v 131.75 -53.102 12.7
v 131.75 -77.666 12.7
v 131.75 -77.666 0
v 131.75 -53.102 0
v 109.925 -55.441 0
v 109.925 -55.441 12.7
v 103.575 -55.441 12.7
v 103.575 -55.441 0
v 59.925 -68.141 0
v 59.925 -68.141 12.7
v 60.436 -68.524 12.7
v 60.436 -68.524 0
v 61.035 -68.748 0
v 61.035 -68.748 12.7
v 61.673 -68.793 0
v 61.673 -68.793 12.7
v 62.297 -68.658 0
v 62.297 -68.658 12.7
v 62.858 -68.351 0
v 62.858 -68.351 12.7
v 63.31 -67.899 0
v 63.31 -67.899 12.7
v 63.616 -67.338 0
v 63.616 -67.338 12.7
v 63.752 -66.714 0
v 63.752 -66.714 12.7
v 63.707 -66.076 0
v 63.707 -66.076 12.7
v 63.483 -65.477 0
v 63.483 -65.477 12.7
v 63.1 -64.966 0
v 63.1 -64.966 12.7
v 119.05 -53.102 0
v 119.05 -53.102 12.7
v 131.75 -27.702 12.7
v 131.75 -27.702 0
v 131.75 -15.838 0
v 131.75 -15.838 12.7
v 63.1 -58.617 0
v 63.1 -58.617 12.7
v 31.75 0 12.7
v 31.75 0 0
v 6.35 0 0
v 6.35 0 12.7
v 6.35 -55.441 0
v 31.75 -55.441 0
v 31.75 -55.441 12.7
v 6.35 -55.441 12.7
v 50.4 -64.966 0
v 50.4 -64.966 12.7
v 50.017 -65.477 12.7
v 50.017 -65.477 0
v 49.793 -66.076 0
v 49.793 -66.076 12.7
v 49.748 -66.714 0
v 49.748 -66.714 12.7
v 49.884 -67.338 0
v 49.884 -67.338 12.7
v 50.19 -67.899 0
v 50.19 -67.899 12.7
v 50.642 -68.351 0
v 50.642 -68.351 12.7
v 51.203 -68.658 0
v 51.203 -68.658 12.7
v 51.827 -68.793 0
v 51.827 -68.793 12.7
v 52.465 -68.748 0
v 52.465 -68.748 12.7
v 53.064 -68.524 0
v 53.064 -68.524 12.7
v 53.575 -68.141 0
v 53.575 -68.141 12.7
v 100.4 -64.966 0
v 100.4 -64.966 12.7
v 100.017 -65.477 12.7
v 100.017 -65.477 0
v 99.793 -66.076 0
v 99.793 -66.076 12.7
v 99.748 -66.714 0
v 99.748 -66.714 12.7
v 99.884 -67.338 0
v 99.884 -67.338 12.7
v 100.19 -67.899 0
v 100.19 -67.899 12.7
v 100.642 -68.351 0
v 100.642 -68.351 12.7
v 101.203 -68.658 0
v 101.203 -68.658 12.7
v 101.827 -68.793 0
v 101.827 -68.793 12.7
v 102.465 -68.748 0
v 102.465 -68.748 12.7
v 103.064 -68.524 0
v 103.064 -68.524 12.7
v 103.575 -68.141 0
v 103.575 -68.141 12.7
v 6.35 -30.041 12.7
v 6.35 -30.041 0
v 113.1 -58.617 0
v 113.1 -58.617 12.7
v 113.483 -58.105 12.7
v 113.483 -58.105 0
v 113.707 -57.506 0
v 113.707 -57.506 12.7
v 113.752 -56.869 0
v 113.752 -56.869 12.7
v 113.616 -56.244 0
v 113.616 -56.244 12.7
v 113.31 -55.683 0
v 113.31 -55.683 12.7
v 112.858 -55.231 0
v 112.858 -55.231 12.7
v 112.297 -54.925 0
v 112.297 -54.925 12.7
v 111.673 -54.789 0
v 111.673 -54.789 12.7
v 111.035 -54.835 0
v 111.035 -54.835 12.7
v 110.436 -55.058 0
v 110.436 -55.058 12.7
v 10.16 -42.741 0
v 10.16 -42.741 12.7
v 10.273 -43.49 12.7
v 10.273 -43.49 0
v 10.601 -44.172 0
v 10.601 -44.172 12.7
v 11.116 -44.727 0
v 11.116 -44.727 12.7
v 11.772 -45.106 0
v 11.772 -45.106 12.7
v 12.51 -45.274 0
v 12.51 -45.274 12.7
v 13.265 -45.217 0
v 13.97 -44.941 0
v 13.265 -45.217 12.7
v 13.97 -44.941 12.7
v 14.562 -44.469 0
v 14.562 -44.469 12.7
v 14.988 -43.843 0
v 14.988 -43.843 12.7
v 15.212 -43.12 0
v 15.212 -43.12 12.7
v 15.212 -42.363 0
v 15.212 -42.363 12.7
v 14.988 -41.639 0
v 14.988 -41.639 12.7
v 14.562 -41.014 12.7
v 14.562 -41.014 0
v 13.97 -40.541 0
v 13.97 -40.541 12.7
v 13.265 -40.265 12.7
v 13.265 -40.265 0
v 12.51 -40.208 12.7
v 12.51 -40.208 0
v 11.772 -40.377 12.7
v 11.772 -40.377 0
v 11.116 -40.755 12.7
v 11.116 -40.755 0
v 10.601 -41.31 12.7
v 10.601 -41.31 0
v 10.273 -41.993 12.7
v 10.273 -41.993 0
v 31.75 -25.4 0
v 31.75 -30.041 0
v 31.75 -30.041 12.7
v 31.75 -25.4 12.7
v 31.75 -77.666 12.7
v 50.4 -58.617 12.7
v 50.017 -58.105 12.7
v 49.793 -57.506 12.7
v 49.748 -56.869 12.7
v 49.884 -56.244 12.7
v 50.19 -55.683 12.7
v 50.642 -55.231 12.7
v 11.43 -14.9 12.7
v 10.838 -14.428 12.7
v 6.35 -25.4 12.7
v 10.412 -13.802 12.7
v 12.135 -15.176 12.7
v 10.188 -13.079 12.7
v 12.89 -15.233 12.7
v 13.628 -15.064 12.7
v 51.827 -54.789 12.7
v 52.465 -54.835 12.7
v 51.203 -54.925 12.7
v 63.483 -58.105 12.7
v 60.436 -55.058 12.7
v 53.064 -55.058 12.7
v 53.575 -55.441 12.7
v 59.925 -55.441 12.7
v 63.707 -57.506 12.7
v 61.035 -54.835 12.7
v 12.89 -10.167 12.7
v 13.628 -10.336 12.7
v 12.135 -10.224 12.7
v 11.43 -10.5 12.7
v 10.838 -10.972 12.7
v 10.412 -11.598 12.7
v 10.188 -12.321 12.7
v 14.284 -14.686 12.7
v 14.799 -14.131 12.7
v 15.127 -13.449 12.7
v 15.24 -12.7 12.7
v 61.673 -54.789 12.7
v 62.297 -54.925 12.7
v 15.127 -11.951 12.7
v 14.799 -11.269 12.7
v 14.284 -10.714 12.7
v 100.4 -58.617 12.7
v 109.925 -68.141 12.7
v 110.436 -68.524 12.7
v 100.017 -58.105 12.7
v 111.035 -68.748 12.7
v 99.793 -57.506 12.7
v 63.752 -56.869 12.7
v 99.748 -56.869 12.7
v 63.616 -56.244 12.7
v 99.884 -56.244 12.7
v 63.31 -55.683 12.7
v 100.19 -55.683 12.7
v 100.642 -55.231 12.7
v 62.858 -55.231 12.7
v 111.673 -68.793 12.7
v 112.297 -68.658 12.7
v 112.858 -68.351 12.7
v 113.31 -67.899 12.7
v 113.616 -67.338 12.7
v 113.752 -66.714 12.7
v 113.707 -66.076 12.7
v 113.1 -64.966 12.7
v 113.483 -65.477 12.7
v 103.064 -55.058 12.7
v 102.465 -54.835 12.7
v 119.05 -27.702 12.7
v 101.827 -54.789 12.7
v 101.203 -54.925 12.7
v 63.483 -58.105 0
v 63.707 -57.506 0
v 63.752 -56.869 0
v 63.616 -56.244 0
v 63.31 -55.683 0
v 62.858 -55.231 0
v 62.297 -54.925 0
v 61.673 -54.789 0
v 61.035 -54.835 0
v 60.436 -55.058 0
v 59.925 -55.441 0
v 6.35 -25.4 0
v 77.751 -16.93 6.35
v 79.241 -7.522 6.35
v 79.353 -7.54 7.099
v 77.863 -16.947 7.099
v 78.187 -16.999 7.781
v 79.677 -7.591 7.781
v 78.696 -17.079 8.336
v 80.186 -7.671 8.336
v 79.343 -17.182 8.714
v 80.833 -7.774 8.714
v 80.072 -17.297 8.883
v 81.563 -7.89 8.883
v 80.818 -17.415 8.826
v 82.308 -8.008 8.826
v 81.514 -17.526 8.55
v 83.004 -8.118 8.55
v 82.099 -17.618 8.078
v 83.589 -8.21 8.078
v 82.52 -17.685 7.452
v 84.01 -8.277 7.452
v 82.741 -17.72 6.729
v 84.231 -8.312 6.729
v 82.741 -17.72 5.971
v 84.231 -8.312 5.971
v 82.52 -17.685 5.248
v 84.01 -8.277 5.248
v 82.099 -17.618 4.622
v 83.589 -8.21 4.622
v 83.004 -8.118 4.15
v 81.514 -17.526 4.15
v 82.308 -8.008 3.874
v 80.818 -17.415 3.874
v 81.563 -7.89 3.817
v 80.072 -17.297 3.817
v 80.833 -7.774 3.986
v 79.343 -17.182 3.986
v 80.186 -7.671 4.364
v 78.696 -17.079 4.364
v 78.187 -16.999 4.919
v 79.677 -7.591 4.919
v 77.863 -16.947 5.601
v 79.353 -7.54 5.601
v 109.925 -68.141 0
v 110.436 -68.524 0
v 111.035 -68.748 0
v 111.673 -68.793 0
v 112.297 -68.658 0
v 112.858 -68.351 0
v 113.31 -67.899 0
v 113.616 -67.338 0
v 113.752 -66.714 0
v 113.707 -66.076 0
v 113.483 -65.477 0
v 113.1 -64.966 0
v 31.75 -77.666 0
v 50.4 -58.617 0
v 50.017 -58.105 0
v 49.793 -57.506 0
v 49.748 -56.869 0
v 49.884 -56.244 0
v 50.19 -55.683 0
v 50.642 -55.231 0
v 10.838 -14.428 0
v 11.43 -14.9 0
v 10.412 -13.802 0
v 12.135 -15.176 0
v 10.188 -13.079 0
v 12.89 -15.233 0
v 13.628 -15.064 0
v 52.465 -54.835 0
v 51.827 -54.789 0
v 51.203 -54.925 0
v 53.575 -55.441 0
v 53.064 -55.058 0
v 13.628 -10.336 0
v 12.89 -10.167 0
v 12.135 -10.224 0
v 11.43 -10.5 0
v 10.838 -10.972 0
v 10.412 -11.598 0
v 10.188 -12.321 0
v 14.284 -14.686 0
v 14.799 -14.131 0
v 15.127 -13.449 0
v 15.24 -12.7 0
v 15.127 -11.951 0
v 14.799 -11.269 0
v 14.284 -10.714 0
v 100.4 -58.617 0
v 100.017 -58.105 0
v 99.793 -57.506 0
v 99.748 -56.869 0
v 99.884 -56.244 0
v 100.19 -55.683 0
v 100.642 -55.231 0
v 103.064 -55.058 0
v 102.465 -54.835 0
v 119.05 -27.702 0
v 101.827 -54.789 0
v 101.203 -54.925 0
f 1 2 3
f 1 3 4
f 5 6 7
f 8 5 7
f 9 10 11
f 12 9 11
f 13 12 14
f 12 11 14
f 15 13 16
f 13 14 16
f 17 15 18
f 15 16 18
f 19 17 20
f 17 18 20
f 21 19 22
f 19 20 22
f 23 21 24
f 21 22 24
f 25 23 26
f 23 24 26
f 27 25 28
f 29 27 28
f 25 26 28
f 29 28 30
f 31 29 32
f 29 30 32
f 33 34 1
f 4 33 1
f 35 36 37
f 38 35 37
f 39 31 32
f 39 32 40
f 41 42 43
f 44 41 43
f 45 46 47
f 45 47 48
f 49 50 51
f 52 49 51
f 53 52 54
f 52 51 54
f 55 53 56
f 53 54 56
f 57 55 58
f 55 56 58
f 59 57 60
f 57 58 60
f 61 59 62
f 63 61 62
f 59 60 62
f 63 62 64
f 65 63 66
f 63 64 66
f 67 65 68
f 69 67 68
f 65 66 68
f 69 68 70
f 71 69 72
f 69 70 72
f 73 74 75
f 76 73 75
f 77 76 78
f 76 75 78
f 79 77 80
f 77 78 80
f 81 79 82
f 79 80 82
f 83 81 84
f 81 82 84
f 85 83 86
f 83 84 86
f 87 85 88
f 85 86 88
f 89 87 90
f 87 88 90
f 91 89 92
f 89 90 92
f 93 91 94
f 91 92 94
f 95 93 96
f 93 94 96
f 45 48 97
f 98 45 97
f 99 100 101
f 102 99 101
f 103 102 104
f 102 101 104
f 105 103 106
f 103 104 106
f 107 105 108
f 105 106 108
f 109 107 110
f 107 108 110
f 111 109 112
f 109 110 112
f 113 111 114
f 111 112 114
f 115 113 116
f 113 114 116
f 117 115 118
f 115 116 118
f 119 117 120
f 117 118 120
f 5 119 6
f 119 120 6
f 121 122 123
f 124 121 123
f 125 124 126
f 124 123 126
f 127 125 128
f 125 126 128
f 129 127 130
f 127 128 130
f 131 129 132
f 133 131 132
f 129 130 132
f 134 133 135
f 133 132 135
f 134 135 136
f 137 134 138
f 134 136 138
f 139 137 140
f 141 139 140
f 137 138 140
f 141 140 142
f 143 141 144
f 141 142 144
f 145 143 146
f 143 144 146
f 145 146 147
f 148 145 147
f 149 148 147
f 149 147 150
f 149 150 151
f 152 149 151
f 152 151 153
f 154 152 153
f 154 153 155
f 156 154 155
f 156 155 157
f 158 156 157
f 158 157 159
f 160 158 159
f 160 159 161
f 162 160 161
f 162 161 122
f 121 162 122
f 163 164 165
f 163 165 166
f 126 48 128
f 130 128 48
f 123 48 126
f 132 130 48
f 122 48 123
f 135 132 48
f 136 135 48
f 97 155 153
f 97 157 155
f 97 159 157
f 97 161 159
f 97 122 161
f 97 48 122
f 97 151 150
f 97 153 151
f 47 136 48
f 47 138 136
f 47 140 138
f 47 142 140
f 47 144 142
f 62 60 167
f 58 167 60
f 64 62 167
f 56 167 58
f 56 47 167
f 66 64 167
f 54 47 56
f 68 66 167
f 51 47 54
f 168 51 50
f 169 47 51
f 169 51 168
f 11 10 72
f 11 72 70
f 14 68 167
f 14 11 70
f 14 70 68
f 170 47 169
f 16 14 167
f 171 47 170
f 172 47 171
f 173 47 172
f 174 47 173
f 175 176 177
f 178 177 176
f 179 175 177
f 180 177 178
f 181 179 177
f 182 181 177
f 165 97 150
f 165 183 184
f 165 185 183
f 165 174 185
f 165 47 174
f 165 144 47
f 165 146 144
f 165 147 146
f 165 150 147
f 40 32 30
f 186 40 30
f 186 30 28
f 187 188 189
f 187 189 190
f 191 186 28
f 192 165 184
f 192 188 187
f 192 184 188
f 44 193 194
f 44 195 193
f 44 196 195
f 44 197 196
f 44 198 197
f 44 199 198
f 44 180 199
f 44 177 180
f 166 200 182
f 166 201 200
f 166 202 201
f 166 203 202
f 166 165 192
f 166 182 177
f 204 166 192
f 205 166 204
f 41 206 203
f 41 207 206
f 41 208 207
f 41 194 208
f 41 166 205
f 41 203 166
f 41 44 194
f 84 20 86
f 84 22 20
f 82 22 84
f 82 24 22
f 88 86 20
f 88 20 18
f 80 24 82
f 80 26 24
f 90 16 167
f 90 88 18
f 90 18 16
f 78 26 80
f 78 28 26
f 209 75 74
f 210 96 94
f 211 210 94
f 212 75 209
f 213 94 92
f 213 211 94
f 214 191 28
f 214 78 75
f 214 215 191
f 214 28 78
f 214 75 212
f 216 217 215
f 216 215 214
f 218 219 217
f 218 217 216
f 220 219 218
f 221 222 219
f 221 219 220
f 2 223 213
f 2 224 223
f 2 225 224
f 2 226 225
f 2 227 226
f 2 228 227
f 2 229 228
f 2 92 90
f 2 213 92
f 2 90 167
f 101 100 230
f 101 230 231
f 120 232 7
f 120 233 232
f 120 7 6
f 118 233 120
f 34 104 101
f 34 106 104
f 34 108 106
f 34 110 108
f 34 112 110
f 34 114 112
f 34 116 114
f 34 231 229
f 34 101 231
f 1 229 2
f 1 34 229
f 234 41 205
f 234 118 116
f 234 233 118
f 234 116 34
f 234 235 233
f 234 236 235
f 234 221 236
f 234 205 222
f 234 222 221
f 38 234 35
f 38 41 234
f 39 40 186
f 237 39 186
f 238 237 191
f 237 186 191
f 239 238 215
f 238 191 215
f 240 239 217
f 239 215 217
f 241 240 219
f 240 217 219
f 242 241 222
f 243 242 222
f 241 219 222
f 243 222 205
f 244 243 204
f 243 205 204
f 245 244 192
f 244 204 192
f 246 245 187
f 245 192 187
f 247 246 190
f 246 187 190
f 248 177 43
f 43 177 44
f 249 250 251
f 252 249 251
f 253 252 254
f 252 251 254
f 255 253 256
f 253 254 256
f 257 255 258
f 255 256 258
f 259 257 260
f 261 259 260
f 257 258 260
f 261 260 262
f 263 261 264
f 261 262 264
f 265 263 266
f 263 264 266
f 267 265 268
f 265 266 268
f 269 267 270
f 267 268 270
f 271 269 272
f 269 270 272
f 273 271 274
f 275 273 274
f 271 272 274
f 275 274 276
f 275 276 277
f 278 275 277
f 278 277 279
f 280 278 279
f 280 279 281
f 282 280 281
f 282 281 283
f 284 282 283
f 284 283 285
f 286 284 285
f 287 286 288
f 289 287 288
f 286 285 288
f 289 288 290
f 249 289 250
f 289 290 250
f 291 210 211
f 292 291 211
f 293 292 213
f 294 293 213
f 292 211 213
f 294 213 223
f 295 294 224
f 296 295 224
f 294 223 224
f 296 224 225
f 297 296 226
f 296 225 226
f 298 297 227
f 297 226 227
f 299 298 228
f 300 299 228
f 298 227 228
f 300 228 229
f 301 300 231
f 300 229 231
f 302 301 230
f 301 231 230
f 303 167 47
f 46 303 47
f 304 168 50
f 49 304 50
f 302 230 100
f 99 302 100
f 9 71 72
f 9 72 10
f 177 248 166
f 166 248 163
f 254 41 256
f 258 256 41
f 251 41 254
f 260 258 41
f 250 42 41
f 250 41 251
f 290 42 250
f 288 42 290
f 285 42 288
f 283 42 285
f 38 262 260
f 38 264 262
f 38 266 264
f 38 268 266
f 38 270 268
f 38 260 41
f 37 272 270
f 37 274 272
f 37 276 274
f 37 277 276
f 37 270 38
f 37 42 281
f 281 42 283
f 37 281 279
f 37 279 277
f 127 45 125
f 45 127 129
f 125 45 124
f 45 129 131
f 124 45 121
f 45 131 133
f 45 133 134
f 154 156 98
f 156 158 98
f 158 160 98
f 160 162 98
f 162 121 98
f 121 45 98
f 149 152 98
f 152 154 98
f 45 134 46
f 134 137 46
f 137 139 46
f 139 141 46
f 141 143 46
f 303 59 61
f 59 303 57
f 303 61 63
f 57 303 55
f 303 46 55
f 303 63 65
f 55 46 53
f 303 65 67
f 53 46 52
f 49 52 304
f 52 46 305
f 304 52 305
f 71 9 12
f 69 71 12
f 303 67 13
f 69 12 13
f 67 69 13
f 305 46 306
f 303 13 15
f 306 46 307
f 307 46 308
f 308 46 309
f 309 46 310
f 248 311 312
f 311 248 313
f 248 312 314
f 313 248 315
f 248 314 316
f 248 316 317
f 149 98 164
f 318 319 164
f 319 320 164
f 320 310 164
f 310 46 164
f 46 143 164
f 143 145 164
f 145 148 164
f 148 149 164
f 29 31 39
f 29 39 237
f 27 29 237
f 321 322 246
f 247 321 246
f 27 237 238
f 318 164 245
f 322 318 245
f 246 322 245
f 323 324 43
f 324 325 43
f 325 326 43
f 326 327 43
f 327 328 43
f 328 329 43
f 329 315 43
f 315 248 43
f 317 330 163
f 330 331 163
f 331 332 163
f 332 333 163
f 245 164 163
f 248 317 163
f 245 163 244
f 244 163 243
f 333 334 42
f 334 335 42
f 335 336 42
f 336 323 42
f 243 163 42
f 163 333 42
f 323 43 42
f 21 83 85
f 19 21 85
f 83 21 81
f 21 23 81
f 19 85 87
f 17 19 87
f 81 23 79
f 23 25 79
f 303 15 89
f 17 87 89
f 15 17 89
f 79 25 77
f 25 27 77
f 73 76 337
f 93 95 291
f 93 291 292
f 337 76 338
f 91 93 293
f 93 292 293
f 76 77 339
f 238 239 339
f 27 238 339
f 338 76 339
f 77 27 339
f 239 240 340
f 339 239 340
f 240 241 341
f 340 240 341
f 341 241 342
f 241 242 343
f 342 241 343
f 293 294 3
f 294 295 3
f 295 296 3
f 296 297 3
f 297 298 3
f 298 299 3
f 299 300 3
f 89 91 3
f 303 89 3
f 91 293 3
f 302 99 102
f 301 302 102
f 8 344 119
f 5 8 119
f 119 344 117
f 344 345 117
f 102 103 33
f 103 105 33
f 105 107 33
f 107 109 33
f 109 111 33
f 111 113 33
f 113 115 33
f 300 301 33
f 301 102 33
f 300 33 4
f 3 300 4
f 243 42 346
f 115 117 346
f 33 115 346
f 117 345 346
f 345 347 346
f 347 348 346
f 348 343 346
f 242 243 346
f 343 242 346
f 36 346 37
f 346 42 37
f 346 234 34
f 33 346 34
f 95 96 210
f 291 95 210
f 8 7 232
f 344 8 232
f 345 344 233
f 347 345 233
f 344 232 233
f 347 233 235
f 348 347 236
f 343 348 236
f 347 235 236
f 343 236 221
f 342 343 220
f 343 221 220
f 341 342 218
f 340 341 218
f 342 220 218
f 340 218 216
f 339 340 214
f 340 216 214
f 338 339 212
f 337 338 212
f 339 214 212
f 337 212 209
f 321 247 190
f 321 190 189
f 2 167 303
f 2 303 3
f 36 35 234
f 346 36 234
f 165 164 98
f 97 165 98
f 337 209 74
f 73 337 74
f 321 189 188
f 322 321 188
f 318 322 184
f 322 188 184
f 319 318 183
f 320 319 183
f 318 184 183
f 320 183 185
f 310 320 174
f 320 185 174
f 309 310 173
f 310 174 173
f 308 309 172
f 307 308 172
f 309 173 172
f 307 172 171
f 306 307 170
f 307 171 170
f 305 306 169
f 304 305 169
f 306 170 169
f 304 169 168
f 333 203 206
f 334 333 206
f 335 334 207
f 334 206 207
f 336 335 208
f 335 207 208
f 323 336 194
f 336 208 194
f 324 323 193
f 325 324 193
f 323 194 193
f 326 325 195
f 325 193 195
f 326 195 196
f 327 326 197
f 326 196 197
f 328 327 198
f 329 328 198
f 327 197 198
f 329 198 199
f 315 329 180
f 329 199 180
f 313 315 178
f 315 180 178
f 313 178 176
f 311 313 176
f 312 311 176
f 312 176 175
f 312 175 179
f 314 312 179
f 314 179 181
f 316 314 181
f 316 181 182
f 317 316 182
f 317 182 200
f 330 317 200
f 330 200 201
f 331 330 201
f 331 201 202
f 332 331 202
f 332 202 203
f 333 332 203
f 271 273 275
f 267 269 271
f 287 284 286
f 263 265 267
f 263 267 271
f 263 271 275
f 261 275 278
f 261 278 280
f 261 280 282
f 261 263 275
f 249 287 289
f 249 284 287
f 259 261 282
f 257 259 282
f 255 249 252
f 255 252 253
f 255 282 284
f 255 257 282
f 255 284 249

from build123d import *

# Parameters (mm, degrees)
BOSS_EXTRUDE1_DEPTH = 12.7
SKETCH2_R           = 2.54
SKETCH2_W           = 19.05
SKETCH2_H           = 55.44118298
CUT_EXTRUDE2_DEPTH  = 149.871187129
SKETCH3_W           = 100
SKETCH3_H           = 12.958545622
CUT_EXTRUDE3_DEPTH  = 149.871187129
SKETCH5_W           = 100
SKETCH5_H           = 9.525
BOSS_EXTRUDE3_DEPTH = 12.7
SKETCH4_R           = 2.24536
CUT_EXTRUDE4_DEPTH  = 154.464616373
SKETCH6_R           = 4.091253385
SKETCH6_R_2         = 6.05236999
SKETCH6_W           = 12.7
SKETCH6_H           = 25.4
BOSS_EXTRUDE4_DEPTH = 12.7
SKETCH7_R           = 2.54
CUT_EXTRUDE5_DEPTH  = 154.464616373
CUT_EXTRUDE6_DEPTH  = 154.464616373
SKETCH9_R           = 2.54
CUT_EXTRUDE7_DEPTH  = 9.525


with BuildPart() as part:
    # Sketch1 → Boss-Extrude1 (new body)
    with BuildSketch(Plane.XY):
        Polygon((31.75, -68.141601517), (31.75, -55.44118298), (0, -55.44118298), (0, -30.04118298), (19.05, -30.04118298), (31.75, -30.04118298), (31.75, -25.4), (19.05, -25.4), (0, -25.4), (0, 0), (19.05, 0), (31.75, 0), (131.75, -15.838444032), (131.75, -68.141601517), align=None)
    extrude(amount=BOSS_EXTRUDE1_DEPTH)

    # Sketch2 → Cut-Extrude2 (cut, through all)
    with BuildSketch(Plane.XY.offset(12.7)):
        with Locations((25.4, -12.7)):
            Circle(SKETCH2_R)
        with Locations(Location((25.4, -42.74118298, 0), (0, 0, 180))):
            Circle(SKETCH2_R)
        with Locations((9.525, -27.72059149)):
            Rectangle(SKETCH2_W, SKETCH2_H)
    extrude(amount=-CUT_EXTRUDE2_DEPTH, mode=Mode.SUBTRACT)

    # Sketch3 → Cut-Extrude3 (cut, through all)
    with BuildSketch(Plane.XY.offset(12.7)):
        with Locations((81.75, -74.620455791)):
            Rectangle(SKETCH3_W, SKETCH3_H)
    extrude(amount=-CUT_EXTRUDE3_DEPTH, mode=Mode.SUBTRACT)

    # Sketch5 → Boss-Extrude3 (add)
    with BuildSketch(Plane.XY.offset(12.7)):
        with Locations((81.75, -72.90368298)):
            Rectangle(SKETCH5_W, SKETCH5_H)
    extrude(amount=-BOSS_EXTRUDE3_DEPTH)

    # Sketch4 → Cut-Extrude4 (cut, through all)
    with BuildSketch(Plane.XY.offset(12.7)):
        with BuildLine():
            ThreePointArc((53.575418537, -55.44118298), (50.399790718, -55.440973698), (50.4, -58.616601517))
            Line((50.4, -58.616601517), (50.4, -55.44118298))
            Line((50.4, -55.44118298), (53.575418537, -55.44118298))
        make_face()
        with BuildLine():
            Line((50.4, -55.44118298), (50.4, -58.616601517))
            ThreePointArc((50.4, -58.616601517), (52.846898781, -59.103068495), (54.23286, -57.02868298))
            ThreePointArc((54.23286, -57.02868298), (54.06199877, -56.169557621), (53.575418537, -55.44118298))
            Line((53.575418537, -55.44118298), (50.4, -55.44118298))
        make_face()
        with Locations((61.5125, -57.02868298)):
            Circle(SKETCH4_R)
        with Locations((51.9875, -57.02868298)):
            Circle(SKETCH4_R)
        with Locations((51.9875, -66.55368298)):
            Circle(SKETCH4_R)
        with Locations((61.5125, -66.55368298)):
            Circle(SKETCH4_R)
        Polygon((63.1, -68.14118298), (63.1, -55.44118298), (56.75, -55.44118298), (50.4, -55.44118298), (50.4, -68.14118298), (56.75, -68.14118298), align=None)
        with BuildLine():
            ThreePointArc((59.924581463, -55.44118298), (59.924790718, -58.616392262), (63.1, -58.616601517))
            Line((63.1, -58.616601517), (63.1, -55.44118298))
            Line((63.1, -55.44118298), (59.924581463, -55.44118298))
        make_face()
        with BuildLine():
            Line((63.1, -55.44118298), (63.1, -58.616601517))
            ThreePointArc((63.1, -58.616601517), (63.586885515, -57.888081761), (63.75786, -57.02868298))
            ThreePointArc((63.75786, -57.02868298), (62.371625359, -54.95418421), (59.924581463, -55.44118298))
            Line((59.924581463, -55.44118298), (63.1, -55.44118298))
        make_face()
        with BuildLine():
            ThreePointArc((63.1, -64.965764443), (59.924790718, -64.965973698), (59.924581463, -68.14118298))
            Line((59.924581463, -68.14118298), (63.1, -68.14118298))
            Line((63.1, -68.14118298), (63.1, -64.965764443))
        make_face()
        with BuildLine():
            Line((63.1, -68.14118298), (59.924581463, -68.14118298))
            ThreePointArc((59.924581463, -68.14118298), (62.371625359, -68.62818175), (63.75786, -66.55368298))
            ThreePointArc((63.75786, -66.55368298), (63.586885515, -65.694284199), (63.1, -64.965764443))
            Line((63.1, -64.965764443), (63.1, -68.14118298))
        make_face()
        with BuildLine():
            ThreePointArc((50.4, -64.965764443), (50.399790718, -68.141392262), (53.575418537, -68.14118298))
            Line((53.575418537, -68.14118298), (50.4, -68.14118298))
            Line((50.4, -68.14118298), (50.4, -64.965764443))
        make_face()
        with BuildLine():
            Line((50.4, -68.14118298), (53.575418537, -68.14118298))
            ThreePointArc((53.575418537, -68.14118298), (54.06199877, -67.412808338), (54.23286, -66.55368298))
            ThreePointArc((54.23286, -66.55368298), (52.846898781, -64.479297465), (50.4, -64.965764443))
            Line((50.4, -64.965764443), (50.4, -68.14118298))
        make_face()
        with Locations((111.5125, -57.02868298)):
            Circle(SKETCH4_R)
        with Locations((101.9875, -57.02868298)):
            Circle(SKETCH4_R)
        with Locations((101.9875, -66.55368298)):
            Circle(SKETCH4_R)
        with Locations((111.5125, -66.55368298)):
            Circle(SKETCH4_R)
        Polygon((113.1, -68.14118298), (113.1, -55.44118298), (106.75, -55.44118298), (100.4, -55.44118298), (100.4, -68.14118298), (106.75, -68.14118298), align=None)
    extrude(amount=-CUT_EXTRUDE4_DEPTH, mode=Mode.SUBTRACT)

    # Sketch6 → Boss-Extrude4 (add)
    with BuildSketch(Plane.XY.offset(12.7)):
        with Locations((25.4, -12.7)):
            Circle(SKETCH6_R)
        with Locations((25.4, -42.74118298)):
            Circle(SKETCH6_R_2)
        with Locations((12.7, -12.7)):
            Rectangle(SKETCH6_W, SKETCH6_H)
        with Locations((12.7, -42.74118298)):
            Rectangle(SKETCH6_W, SKETCH6_H)
    extrude(amount=-BOSS_EXTRUDE4_DEPTH)

    # Sketch7 → Cut-Extrude5 (cut, through all)
    with BuildSketch(Plane.XY.offset(12.7)):
        with Locations((12.7, -12.7)):
            Circle(SKETCH7_R)
        with Locations(Location((12.7, -42.74118298, 0), (0, 0, 180))):
            Circle(SKETCH7_R)
    extrude(amount=-CUT_EXTRUDE5_DEPTH, mode=Mode.SUBTRACT)

    # Sketch8 → Cut-Extrude6 (cut, through all)
    with BuildSketch(Plane.XY.offset(12.7)):
        Polygon((131.75, -46.752313506), (131.75, -27.702313506), (119.05, -27.702313506), (119.05, -46.752313506), (119.05, -53.102313506), (131.75, -53.102313506), align=None)
    extrude(amount=-CUT_EXTRUDE6_DEPTH, mode=Mode.SUBTRACT)

    # Sketch9 → Cut-Extrude7 (cut)
    with BuildSketch(Plane(origin=(0.776977804, 4.905644786, 0), x_dir=(0.9876883405951382, -0.15643446504022795, 0), z_dir=(0.15643446504022795, 0.9876883405951383, 0))):
        with Locations(Location((81.982361103, -6.35, 0), (0, 0, 180))):
            Circle(SKETCH9_R)
    extrude(amount=-CUT_EXTRUDE7_DEPTH, mode=Mode.SUBTRACT)


solid = part.part
